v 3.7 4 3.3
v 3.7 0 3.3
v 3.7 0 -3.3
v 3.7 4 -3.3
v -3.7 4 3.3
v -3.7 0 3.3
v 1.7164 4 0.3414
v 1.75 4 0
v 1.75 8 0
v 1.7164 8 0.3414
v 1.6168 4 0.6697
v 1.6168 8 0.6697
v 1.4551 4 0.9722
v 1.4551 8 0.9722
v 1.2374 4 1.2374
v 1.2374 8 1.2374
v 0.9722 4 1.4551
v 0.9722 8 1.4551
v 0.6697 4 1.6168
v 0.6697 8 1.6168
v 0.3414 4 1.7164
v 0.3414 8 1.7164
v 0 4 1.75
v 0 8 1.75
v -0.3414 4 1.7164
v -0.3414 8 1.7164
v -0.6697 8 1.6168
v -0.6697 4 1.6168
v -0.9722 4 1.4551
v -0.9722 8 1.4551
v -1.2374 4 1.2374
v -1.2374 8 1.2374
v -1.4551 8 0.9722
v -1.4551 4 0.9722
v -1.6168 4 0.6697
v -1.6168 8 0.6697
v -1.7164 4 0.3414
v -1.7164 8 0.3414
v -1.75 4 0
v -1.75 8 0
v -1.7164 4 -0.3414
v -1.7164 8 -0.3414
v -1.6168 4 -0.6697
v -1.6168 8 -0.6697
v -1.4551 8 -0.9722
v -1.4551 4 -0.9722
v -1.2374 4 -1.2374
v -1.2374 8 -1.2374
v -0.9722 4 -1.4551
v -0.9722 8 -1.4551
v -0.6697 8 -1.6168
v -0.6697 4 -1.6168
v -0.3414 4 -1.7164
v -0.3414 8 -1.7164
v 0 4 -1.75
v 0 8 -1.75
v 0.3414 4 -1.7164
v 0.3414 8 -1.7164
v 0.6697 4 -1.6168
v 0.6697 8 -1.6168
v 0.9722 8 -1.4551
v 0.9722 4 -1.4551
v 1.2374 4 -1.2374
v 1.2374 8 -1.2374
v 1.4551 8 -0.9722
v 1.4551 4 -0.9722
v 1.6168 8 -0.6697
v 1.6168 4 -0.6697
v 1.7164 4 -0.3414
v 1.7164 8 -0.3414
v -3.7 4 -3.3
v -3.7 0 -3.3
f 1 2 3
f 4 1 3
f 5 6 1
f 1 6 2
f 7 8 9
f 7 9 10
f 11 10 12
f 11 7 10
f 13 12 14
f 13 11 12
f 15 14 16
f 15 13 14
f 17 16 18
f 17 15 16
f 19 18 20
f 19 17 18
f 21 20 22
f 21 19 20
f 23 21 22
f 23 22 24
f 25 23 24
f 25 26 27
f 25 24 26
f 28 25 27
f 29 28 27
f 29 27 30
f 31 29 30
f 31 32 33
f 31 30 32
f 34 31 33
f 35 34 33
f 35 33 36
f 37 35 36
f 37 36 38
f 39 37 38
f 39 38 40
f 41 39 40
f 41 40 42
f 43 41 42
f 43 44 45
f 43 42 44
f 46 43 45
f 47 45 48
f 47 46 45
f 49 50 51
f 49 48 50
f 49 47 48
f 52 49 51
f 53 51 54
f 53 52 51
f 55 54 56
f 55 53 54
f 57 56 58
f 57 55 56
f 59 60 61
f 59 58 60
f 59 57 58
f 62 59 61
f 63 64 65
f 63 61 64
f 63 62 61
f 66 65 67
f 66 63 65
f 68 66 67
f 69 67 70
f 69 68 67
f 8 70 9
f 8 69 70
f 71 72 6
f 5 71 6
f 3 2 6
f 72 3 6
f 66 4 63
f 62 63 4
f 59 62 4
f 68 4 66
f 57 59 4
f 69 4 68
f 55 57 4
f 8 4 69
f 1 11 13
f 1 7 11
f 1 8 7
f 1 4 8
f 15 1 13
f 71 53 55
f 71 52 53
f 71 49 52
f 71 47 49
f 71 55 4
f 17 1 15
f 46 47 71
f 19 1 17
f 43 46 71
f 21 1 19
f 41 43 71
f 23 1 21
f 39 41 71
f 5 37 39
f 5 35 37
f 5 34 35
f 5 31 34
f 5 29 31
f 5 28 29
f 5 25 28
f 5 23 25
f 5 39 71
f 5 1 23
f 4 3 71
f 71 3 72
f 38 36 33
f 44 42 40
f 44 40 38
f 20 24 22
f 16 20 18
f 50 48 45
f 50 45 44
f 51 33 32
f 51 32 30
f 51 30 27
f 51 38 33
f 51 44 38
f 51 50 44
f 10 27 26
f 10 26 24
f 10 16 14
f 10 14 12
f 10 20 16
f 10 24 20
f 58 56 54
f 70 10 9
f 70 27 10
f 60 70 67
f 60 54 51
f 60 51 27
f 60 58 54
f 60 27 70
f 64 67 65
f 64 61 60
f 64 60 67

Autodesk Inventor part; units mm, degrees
ref_plane "YZ Plane" through (0, 0, 0) normal (1, 0, 0) x (0, 1, 0)
ref_plane "XZ Plane" through (0, 0, 0) normal (0, 1, 0) x (-1, 0, 0)
ref_plane "XY Plane" through (0, 0, 0) normal (0, 0, 1) x (1, 0, 0)
sketch "Эскиз1" plane through (0, 0, 0) normal (0, 1, 0) x (-1, 0, 0)
  line L0 (3.7, 3.3) -> (-3.7, 3.3)
  line L1 (-3.7, 3.3) -> (-3.7, -3.3)
  line L2 (-3.7, -3.3) -> (3.7, -3.3)
  line L3 (3.7, -3.3) -> (3.7, 3.3)
  point P0 (0, 0)
  dimension "d1" = 6.6
  dimension "d2" = 7.4
  dimension "d3" = 3.3
  dimension "d4" = 3.7
extrude "Выдавливание1" add sketch "Эскиз1" along normal blind 4
sketch "Эскиз2" plane through (0, 4, 0) normal (0, 1, 0) x (1, 0, 0)
  circle A0 centre (0, 0) radius 1.75
  dimension "d7" = 3.5
extrude "Выдавливание2" add sketch "Эскиз2" along normal blind 4
properties part number "btn"
